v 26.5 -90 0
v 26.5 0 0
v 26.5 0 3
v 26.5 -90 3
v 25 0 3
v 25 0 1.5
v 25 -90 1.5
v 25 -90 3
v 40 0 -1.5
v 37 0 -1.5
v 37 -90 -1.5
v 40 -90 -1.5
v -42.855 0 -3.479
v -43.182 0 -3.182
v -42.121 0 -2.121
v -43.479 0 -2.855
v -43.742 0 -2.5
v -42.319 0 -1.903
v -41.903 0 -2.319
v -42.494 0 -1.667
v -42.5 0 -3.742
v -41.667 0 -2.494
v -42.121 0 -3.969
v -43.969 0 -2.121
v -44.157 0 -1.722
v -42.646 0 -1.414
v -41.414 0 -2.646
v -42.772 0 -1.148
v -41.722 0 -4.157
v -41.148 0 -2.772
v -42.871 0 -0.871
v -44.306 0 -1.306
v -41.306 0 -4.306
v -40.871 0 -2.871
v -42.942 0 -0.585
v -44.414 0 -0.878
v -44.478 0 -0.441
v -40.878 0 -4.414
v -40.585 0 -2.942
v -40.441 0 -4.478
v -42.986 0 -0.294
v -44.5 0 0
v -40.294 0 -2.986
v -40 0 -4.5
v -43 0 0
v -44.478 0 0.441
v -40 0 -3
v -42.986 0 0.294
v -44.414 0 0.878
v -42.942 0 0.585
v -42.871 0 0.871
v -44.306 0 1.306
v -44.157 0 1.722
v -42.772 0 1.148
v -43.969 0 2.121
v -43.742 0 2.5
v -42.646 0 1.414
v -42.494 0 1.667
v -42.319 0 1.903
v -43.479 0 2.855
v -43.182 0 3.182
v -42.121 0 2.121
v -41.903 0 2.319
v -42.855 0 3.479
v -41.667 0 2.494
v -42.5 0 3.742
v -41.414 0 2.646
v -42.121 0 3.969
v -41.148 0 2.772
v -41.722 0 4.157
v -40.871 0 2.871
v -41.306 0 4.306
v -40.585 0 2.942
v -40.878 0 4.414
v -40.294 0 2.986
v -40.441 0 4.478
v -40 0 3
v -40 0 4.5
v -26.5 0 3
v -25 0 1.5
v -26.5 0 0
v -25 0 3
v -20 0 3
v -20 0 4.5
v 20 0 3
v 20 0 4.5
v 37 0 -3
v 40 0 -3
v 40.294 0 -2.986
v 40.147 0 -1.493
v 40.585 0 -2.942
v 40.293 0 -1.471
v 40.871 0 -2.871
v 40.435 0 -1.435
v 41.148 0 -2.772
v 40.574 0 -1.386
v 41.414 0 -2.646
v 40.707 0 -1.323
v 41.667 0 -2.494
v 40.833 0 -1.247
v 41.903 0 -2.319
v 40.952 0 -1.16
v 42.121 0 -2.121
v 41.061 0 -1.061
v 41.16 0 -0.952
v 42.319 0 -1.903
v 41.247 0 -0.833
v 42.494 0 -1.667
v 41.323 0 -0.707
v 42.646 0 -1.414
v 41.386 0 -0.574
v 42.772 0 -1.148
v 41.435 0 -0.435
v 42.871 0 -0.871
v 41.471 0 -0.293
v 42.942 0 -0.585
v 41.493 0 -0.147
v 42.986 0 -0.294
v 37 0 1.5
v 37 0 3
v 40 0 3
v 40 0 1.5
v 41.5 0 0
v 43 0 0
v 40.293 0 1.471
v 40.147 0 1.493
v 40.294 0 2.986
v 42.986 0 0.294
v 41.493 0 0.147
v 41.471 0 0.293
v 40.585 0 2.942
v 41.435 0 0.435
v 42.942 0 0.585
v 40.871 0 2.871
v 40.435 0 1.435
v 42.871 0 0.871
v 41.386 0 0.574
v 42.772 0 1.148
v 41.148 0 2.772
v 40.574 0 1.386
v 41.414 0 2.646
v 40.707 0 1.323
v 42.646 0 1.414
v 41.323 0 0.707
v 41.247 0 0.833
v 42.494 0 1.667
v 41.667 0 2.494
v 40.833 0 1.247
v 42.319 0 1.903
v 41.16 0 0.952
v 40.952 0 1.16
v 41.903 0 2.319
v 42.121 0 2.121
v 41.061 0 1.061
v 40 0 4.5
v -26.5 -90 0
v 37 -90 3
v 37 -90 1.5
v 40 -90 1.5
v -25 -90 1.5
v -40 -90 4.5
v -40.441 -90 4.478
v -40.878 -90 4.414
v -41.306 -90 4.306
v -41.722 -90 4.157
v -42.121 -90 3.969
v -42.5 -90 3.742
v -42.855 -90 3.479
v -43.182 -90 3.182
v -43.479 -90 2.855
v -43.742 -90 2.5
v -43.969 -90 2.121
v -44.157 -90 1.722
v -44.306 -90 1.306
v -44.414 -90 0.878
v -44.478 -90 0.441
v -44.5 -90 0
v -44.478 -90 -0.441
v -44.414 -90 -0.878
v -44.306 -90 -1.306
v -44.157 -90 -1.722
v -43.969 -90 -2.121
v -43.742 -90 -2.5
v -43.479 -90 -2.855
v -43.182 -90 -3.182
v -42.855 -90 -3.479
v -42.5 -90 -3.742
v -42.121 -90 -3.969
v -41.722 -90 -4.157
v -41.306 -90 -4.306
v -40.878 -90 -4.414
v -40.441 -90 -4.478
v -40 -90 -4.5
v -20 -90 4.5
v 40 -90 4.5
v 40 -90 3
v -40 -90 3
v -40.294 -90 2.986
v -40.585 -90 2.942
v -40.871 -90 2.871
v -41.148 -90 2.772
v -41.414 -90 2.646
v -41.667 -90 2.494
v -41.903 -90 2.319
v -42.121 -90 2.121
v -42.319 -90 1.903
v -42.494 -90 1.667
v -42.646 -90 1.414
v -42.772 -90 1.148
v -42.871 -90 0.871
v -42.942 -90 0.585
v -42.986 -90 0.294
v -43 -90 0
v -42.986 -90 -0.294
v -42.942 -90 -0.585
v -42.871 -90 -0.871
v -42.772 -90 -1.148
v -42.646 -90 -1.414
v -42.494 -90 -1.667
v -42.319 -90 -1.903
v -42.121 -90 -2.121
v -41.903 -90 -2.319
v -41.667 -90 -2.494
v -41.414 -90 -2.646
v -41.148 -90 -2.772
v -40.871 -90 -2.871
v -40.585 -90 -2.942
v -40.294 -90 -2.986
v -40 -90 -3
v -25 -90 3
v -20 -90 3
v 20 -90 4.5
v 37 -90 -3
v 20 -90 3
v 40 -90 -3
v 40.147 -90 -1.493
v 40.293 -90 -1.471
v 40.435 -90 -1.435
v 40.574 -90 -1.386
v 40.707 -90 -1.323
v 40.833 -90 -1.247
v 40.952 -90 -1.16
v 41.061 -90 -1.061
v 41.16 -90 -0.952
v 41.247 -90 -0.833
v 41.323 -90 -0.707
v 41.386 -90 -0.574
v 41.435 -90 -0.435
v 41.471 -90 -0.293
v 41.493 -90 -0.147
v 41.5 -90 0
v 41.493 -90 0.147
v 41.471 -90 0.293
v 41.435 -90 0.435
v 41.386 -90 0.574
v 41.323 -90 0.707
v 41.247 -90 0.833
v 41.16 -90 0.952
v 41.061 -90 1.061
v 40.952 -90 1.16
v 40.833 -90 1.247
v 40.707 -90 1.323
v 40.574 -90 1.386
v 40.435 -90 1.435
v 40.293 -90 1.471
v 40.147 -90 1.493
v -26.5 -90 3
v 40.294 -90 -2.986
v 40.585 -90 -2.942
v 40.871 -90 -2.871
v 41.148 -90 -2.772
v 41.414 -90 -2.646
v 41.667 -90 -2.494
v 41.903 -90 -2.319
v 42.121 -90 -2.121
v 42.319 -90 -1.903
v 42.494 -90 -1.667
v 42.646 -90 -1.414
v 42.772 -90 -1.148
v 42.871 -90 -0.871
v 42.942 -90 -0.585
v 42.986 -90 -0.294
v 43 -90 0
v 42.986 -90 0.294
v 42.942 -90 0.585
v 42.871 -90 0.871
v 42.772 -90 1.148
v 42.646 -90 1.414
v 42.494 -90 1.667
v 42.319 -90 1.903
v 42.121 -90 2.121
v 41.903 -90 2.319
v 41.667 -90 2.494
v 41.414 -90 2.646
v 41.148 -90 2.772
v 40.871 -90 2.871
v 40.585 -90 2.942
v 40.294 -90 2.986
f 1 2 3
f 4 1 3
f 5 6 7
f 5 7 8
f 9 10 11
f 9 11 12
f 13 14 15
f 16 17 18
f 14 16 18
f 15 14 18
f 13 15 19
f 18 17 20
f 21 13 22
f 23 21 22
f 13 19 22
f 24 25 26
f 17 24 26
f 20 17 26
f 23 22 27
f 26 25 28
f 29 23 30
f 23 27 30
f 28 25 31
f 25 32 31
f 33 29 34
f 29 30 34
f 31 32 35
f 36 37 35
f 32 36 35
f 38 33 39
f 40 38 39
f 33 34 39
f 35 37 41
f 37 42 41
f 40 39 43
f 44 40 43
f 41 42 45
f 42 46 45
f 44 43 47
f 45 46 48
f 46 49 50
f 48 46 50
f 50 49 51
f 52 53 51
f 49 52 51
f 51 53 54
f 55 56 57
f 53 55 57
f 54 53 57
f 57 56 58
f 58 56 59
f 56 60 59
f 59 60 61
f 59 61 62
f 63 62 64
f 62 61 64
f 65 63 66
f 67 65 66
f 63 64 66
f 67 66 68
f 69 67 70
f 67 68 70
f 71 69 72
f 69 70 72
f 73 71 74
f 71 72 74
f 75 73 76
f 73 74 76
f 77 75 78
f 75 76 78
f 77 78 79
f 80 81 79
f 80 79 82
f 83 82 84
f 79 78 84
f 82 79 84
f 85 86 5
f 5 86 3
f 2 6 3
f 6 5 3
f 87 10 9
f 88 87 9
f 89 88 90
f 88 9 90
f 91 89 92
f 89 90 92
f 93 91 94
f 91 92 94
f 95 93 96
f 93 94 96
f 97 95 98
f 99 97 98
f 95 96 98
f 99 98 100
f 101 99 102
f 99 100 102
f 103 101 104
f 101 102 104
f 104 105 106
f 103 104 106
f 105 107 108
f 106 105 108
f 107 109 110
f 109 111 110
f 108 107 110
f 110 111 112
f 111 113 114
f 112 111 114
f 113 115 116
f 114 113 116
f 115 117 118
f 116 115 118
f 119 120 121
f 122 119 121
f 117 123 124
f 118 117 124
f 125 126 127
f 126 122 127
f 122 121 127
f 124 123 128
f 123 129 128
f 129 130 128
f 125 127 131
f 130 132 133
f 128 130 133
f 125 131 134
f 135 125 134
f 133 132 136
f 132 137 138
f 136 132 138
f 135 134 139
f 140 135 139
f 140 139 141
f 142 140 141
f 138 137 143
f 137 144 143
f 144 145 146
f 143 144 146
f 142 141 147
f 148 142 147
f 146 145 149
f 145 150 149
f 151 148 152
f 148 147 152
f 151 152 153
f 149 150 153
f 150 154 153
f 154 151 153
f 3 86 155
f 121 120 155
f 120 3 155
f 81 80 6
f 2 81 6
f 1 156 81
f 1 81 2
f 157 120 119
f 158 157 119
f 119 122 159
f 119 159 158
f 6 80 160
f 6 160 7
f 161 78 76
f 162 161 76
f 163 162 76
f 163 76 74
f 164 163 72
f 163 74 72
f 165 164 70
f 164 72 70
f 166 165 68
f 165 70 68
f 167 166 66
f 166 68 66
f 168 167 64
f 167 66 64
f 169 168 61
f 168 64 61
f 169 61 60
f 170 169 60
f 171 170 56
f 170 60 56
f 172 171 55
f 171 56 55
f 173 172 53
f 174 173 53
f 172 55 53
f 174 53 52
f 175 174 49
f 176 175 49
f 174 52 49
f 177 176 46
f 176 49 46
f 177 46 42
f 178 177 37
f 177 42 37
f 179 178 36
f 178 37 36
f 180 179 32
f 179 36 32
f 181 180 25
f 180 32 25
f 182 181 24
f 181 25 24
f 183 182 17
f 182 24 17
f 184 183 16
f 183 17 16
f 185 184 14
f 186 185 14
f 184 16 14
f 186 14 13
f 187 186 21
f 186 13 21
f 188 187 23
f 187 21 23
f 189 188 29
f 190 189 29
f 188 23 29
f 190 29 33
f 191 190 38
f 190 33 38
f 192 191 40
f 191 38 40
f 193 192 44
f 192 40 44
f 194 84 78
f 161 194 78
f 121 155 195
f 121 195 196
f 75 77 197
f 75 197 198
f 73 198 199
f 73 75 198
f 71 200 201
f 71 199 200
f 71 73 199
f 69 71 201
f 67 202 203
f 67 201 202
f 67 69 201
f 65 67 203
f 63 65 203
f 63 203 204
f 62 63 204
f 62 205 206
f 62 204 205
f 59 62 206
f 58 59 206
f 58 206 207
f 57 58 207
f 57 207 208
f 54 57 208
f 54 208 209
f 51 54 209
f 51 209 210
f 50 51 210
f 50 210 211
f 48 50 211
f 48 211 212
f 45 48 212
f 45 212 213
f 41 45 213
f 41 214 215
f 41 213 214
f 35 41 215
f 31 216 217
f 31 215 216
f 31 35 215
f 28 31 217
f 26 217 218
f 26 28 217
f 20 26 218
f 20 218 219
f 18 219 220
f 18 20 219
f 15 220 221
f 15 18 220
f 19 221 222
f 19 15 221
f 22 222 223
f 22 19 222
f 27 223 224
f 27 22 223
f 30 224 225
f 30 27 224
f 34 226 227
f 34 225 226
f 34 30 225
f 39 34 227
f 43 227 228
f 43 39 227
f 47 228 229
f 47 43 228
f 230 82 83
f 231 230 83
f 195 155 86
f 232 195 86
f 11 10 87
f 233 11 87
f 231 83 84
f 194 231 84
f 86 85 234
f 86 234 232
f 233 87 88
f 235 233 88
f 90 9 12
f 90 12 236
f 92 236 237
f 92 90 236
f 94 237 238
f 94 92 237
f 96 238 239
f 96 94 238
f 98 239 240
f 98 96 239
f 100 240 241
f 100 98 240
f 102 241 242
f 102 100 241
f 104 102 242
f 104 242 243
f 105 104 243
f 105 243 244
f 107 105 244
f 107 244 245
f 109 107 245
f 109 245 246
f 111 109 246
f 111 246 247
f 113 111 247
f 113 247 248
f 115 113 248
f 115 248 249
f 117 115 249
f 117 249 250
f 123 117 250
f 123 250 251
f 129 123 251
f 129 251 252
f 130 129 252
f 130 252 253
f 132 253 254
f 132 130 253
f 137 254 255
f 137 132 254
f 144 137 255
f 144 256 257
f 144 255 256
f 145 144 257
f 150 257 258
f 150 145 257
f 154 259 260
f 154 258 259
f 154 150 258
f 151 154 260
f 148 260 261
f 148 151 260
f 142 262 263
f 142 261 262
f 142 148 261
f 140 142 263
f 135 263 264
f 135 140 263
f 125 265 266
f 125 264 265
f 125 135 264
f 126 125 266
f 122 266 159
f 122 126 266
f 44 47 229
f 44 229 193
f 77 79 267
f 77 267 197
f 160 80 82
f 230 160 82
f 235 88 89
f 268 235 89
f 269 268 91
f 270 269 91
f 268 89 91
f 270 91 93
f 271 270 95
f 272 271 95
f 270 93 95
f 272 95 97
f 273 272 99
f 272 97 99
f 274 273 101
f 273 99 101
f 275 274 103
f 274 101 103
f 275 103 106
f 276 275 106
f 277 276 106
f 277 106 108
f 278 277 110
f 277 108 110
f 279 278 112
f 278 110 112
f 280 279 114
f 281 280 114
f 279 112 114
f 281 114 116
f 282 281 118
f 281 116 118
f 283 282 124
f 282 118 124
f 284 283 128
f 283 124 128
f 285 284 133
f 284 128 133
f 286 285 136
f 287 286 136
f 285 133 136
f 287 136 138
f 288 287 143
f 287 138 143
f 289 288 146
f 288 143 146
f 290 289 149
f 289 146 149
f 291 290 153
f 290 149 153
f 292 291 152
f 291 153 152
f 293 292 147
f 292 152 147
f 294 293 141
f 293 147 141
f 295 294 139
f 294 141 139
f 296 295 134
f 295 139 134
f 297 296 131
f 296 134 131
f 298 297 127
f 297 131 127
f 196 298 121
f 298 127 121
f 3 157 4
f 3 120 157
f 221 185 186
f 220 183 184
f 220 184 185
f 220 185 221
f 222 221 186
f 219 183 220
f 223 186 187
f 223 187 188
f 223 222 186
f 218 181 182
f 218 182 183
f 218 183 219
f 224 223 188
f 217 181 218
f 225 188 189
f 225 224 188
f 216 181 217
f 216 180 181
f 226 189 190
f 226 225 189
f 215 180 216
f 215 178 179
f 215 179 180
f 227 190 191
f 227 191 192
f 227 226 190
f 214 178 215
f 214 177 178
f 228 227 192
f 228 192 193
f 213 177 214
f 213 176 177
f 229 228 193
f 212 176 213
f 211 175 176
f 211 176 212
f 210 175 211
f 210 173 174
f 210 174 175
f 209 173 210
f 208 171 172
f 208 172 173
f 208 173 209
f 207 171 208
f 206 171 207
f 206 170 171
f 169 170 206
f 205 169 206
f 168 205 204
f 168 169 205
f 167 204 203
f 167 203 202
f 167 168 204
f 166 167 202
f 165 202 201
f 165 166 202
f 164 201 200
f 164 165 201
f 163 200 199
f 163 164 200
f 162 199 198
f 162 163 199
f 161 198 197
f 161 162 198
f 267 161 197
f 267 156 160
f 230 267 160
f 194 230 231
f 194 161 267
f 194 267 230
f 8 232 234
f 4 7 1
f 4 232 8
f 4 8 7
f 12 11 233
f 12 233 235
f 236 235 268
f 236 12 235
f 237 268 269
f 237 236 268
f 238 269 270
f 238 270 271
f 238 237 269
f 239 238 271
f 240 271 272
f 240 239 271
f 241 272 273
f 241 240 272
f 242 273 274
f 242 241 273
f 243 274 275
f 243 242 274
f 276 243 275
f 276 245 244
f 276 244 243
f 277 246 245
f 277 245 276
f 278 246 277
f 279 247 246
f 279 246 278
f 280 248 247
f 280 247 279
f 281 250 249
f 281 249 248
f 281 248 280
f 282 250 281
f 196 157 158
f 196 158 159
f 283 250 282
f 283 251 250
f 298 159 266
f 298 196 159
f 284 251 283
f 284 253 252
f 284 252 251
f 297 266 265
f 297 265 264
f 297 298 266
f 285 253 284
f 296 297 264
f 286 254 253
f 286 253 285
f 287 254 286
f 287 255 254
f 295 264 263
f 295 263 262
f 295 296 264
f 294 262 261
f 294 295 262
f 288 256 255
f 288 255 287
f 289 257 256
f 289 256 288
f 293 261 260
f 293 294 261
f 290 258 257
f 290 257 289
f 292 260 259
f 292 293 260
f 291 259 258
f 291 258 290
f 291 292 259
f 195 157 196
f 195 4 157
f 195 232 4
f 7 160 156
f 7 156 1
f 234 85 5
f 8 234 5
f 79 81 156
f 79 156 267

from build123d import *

# Parameters (mm, degrees)
F1_DEPTH  = 90
F2_W      = 50
F2_H      = 3
F3_DEPTH  = 90.001
F4_T      = -1.5
F6_DEPTH  = 90.001
F7_W      = 5
F7_H      = 1.5
F8_DEPTH  = 90
F10_DEPTH = 90.001


with BuildPart() as f1:
    # F0 (on Front) → F1 (new body)
    with BuildSketch(Plane.XZ):
        with BuildLine():
            ThreePointArc((40.0000004103, -4.5), (44.4999995897, 4.103e-07), (39.9999995897, 4.5))
            Line((39.9999995897, 4.5), (-40.0000004103, 4.5))
            ThreePointArc((-40.0000004103, 4.5), (-44.5000004103, -4.103e-07), (-39.9999995897, -4.5))
            Line((-39.9999995897, -4.5), (40.0000004103, -4.5))
        make_face()
    extrude(amount=F1_DEPTH)

    # F2 (on Front) → F3 (cut, through all)
    with BuildSketch(Plane.XZ):
        with Locations((-4.103e-07, 3)):
            Rectangle(F2_W, F2_H)
    extrude(amount=F3_DEPTH, mode=Mode.SUBTRACT)

    # F4
    f4_openings = [f1.faces().sort_by_distance(p)[0] for p in [
        (0, -90, -0.710208),
        (0, 0, -0.710208),
    ]]
    offset(amount=F4_T, openings=f4_openings, kind=Kind.INTERSECTION)

    # F5 (on Front) → F6 (cut, through all)
    with BuildSketch(Plane.XZ):
        with BuildLine():
            ThreePointArc((39.9999995897, 3), (42.9999995897, 4.103e-07), (40.0000004103, -3))
            Line((40.0000004103, -3), (-39.9999998632, -3))
            Line((-39.9999998632, -3), (-39.9999995897, -4.5))
            Line((-39.9999995897, -4.5), (40.0000004103, -4.5))
            ThreePointArc((40.0000004103, -4.5), (44.4999995897, 4.103e-07), (39.9999995897, 4.5))
            Line((39.9999995897, 4.5), (39.9999995897, 3))
        make_face()
    extrude(amount=F6_DEPTH, mode=Mode.SUBTRACT)

    # F7 (on Front) → F8 (join, through all)
    with BuildSketch(Plane.XZ):
        with BuildLine():
            Line((36.9999995897, -3), (39.9999995897, -3))
            ThreePointArc((39.9999995897, -3), (42.9999995897, 0), (39.9999995897, 3))
            Line((39.9999995897, 3), (36.9999995897, 3))
            Line((36.9999995897, 3), (36.9999995897, 0))
            Line((36.9999995897, 0), (36.9999995897, -3))
        make_face()
        with Locations((-22.5000004103, 3.75)):
            Rectangle(F7_W, F7_H)
        with Locations((22.5000004103, 3.75)):
            Rectangle(F7_W, F7_H)
    extrude(amount=F8_DEPTH)

    # F9 (on Front) → F10 (cut, through all)
    with BuildSketch(Plane.XZ):
        with BuildLine():
            Line((36.9999995897, -1.5), (39.9999995897, -1.5))
            ThreePointArc((39.9999995897, -1.5), (41.4999995897, 0), (39.9999995897, 1.5))
            Line((39.9999995897, 1.5), (36.9999995897, 1.5))
            Line((36.9999995897, 1.5), (36.9999995897, -1.5))
        make_face()
    extrude(amount=F10_DEPTH, mode=Mode.SUBTRACT)


solid = f1.part
